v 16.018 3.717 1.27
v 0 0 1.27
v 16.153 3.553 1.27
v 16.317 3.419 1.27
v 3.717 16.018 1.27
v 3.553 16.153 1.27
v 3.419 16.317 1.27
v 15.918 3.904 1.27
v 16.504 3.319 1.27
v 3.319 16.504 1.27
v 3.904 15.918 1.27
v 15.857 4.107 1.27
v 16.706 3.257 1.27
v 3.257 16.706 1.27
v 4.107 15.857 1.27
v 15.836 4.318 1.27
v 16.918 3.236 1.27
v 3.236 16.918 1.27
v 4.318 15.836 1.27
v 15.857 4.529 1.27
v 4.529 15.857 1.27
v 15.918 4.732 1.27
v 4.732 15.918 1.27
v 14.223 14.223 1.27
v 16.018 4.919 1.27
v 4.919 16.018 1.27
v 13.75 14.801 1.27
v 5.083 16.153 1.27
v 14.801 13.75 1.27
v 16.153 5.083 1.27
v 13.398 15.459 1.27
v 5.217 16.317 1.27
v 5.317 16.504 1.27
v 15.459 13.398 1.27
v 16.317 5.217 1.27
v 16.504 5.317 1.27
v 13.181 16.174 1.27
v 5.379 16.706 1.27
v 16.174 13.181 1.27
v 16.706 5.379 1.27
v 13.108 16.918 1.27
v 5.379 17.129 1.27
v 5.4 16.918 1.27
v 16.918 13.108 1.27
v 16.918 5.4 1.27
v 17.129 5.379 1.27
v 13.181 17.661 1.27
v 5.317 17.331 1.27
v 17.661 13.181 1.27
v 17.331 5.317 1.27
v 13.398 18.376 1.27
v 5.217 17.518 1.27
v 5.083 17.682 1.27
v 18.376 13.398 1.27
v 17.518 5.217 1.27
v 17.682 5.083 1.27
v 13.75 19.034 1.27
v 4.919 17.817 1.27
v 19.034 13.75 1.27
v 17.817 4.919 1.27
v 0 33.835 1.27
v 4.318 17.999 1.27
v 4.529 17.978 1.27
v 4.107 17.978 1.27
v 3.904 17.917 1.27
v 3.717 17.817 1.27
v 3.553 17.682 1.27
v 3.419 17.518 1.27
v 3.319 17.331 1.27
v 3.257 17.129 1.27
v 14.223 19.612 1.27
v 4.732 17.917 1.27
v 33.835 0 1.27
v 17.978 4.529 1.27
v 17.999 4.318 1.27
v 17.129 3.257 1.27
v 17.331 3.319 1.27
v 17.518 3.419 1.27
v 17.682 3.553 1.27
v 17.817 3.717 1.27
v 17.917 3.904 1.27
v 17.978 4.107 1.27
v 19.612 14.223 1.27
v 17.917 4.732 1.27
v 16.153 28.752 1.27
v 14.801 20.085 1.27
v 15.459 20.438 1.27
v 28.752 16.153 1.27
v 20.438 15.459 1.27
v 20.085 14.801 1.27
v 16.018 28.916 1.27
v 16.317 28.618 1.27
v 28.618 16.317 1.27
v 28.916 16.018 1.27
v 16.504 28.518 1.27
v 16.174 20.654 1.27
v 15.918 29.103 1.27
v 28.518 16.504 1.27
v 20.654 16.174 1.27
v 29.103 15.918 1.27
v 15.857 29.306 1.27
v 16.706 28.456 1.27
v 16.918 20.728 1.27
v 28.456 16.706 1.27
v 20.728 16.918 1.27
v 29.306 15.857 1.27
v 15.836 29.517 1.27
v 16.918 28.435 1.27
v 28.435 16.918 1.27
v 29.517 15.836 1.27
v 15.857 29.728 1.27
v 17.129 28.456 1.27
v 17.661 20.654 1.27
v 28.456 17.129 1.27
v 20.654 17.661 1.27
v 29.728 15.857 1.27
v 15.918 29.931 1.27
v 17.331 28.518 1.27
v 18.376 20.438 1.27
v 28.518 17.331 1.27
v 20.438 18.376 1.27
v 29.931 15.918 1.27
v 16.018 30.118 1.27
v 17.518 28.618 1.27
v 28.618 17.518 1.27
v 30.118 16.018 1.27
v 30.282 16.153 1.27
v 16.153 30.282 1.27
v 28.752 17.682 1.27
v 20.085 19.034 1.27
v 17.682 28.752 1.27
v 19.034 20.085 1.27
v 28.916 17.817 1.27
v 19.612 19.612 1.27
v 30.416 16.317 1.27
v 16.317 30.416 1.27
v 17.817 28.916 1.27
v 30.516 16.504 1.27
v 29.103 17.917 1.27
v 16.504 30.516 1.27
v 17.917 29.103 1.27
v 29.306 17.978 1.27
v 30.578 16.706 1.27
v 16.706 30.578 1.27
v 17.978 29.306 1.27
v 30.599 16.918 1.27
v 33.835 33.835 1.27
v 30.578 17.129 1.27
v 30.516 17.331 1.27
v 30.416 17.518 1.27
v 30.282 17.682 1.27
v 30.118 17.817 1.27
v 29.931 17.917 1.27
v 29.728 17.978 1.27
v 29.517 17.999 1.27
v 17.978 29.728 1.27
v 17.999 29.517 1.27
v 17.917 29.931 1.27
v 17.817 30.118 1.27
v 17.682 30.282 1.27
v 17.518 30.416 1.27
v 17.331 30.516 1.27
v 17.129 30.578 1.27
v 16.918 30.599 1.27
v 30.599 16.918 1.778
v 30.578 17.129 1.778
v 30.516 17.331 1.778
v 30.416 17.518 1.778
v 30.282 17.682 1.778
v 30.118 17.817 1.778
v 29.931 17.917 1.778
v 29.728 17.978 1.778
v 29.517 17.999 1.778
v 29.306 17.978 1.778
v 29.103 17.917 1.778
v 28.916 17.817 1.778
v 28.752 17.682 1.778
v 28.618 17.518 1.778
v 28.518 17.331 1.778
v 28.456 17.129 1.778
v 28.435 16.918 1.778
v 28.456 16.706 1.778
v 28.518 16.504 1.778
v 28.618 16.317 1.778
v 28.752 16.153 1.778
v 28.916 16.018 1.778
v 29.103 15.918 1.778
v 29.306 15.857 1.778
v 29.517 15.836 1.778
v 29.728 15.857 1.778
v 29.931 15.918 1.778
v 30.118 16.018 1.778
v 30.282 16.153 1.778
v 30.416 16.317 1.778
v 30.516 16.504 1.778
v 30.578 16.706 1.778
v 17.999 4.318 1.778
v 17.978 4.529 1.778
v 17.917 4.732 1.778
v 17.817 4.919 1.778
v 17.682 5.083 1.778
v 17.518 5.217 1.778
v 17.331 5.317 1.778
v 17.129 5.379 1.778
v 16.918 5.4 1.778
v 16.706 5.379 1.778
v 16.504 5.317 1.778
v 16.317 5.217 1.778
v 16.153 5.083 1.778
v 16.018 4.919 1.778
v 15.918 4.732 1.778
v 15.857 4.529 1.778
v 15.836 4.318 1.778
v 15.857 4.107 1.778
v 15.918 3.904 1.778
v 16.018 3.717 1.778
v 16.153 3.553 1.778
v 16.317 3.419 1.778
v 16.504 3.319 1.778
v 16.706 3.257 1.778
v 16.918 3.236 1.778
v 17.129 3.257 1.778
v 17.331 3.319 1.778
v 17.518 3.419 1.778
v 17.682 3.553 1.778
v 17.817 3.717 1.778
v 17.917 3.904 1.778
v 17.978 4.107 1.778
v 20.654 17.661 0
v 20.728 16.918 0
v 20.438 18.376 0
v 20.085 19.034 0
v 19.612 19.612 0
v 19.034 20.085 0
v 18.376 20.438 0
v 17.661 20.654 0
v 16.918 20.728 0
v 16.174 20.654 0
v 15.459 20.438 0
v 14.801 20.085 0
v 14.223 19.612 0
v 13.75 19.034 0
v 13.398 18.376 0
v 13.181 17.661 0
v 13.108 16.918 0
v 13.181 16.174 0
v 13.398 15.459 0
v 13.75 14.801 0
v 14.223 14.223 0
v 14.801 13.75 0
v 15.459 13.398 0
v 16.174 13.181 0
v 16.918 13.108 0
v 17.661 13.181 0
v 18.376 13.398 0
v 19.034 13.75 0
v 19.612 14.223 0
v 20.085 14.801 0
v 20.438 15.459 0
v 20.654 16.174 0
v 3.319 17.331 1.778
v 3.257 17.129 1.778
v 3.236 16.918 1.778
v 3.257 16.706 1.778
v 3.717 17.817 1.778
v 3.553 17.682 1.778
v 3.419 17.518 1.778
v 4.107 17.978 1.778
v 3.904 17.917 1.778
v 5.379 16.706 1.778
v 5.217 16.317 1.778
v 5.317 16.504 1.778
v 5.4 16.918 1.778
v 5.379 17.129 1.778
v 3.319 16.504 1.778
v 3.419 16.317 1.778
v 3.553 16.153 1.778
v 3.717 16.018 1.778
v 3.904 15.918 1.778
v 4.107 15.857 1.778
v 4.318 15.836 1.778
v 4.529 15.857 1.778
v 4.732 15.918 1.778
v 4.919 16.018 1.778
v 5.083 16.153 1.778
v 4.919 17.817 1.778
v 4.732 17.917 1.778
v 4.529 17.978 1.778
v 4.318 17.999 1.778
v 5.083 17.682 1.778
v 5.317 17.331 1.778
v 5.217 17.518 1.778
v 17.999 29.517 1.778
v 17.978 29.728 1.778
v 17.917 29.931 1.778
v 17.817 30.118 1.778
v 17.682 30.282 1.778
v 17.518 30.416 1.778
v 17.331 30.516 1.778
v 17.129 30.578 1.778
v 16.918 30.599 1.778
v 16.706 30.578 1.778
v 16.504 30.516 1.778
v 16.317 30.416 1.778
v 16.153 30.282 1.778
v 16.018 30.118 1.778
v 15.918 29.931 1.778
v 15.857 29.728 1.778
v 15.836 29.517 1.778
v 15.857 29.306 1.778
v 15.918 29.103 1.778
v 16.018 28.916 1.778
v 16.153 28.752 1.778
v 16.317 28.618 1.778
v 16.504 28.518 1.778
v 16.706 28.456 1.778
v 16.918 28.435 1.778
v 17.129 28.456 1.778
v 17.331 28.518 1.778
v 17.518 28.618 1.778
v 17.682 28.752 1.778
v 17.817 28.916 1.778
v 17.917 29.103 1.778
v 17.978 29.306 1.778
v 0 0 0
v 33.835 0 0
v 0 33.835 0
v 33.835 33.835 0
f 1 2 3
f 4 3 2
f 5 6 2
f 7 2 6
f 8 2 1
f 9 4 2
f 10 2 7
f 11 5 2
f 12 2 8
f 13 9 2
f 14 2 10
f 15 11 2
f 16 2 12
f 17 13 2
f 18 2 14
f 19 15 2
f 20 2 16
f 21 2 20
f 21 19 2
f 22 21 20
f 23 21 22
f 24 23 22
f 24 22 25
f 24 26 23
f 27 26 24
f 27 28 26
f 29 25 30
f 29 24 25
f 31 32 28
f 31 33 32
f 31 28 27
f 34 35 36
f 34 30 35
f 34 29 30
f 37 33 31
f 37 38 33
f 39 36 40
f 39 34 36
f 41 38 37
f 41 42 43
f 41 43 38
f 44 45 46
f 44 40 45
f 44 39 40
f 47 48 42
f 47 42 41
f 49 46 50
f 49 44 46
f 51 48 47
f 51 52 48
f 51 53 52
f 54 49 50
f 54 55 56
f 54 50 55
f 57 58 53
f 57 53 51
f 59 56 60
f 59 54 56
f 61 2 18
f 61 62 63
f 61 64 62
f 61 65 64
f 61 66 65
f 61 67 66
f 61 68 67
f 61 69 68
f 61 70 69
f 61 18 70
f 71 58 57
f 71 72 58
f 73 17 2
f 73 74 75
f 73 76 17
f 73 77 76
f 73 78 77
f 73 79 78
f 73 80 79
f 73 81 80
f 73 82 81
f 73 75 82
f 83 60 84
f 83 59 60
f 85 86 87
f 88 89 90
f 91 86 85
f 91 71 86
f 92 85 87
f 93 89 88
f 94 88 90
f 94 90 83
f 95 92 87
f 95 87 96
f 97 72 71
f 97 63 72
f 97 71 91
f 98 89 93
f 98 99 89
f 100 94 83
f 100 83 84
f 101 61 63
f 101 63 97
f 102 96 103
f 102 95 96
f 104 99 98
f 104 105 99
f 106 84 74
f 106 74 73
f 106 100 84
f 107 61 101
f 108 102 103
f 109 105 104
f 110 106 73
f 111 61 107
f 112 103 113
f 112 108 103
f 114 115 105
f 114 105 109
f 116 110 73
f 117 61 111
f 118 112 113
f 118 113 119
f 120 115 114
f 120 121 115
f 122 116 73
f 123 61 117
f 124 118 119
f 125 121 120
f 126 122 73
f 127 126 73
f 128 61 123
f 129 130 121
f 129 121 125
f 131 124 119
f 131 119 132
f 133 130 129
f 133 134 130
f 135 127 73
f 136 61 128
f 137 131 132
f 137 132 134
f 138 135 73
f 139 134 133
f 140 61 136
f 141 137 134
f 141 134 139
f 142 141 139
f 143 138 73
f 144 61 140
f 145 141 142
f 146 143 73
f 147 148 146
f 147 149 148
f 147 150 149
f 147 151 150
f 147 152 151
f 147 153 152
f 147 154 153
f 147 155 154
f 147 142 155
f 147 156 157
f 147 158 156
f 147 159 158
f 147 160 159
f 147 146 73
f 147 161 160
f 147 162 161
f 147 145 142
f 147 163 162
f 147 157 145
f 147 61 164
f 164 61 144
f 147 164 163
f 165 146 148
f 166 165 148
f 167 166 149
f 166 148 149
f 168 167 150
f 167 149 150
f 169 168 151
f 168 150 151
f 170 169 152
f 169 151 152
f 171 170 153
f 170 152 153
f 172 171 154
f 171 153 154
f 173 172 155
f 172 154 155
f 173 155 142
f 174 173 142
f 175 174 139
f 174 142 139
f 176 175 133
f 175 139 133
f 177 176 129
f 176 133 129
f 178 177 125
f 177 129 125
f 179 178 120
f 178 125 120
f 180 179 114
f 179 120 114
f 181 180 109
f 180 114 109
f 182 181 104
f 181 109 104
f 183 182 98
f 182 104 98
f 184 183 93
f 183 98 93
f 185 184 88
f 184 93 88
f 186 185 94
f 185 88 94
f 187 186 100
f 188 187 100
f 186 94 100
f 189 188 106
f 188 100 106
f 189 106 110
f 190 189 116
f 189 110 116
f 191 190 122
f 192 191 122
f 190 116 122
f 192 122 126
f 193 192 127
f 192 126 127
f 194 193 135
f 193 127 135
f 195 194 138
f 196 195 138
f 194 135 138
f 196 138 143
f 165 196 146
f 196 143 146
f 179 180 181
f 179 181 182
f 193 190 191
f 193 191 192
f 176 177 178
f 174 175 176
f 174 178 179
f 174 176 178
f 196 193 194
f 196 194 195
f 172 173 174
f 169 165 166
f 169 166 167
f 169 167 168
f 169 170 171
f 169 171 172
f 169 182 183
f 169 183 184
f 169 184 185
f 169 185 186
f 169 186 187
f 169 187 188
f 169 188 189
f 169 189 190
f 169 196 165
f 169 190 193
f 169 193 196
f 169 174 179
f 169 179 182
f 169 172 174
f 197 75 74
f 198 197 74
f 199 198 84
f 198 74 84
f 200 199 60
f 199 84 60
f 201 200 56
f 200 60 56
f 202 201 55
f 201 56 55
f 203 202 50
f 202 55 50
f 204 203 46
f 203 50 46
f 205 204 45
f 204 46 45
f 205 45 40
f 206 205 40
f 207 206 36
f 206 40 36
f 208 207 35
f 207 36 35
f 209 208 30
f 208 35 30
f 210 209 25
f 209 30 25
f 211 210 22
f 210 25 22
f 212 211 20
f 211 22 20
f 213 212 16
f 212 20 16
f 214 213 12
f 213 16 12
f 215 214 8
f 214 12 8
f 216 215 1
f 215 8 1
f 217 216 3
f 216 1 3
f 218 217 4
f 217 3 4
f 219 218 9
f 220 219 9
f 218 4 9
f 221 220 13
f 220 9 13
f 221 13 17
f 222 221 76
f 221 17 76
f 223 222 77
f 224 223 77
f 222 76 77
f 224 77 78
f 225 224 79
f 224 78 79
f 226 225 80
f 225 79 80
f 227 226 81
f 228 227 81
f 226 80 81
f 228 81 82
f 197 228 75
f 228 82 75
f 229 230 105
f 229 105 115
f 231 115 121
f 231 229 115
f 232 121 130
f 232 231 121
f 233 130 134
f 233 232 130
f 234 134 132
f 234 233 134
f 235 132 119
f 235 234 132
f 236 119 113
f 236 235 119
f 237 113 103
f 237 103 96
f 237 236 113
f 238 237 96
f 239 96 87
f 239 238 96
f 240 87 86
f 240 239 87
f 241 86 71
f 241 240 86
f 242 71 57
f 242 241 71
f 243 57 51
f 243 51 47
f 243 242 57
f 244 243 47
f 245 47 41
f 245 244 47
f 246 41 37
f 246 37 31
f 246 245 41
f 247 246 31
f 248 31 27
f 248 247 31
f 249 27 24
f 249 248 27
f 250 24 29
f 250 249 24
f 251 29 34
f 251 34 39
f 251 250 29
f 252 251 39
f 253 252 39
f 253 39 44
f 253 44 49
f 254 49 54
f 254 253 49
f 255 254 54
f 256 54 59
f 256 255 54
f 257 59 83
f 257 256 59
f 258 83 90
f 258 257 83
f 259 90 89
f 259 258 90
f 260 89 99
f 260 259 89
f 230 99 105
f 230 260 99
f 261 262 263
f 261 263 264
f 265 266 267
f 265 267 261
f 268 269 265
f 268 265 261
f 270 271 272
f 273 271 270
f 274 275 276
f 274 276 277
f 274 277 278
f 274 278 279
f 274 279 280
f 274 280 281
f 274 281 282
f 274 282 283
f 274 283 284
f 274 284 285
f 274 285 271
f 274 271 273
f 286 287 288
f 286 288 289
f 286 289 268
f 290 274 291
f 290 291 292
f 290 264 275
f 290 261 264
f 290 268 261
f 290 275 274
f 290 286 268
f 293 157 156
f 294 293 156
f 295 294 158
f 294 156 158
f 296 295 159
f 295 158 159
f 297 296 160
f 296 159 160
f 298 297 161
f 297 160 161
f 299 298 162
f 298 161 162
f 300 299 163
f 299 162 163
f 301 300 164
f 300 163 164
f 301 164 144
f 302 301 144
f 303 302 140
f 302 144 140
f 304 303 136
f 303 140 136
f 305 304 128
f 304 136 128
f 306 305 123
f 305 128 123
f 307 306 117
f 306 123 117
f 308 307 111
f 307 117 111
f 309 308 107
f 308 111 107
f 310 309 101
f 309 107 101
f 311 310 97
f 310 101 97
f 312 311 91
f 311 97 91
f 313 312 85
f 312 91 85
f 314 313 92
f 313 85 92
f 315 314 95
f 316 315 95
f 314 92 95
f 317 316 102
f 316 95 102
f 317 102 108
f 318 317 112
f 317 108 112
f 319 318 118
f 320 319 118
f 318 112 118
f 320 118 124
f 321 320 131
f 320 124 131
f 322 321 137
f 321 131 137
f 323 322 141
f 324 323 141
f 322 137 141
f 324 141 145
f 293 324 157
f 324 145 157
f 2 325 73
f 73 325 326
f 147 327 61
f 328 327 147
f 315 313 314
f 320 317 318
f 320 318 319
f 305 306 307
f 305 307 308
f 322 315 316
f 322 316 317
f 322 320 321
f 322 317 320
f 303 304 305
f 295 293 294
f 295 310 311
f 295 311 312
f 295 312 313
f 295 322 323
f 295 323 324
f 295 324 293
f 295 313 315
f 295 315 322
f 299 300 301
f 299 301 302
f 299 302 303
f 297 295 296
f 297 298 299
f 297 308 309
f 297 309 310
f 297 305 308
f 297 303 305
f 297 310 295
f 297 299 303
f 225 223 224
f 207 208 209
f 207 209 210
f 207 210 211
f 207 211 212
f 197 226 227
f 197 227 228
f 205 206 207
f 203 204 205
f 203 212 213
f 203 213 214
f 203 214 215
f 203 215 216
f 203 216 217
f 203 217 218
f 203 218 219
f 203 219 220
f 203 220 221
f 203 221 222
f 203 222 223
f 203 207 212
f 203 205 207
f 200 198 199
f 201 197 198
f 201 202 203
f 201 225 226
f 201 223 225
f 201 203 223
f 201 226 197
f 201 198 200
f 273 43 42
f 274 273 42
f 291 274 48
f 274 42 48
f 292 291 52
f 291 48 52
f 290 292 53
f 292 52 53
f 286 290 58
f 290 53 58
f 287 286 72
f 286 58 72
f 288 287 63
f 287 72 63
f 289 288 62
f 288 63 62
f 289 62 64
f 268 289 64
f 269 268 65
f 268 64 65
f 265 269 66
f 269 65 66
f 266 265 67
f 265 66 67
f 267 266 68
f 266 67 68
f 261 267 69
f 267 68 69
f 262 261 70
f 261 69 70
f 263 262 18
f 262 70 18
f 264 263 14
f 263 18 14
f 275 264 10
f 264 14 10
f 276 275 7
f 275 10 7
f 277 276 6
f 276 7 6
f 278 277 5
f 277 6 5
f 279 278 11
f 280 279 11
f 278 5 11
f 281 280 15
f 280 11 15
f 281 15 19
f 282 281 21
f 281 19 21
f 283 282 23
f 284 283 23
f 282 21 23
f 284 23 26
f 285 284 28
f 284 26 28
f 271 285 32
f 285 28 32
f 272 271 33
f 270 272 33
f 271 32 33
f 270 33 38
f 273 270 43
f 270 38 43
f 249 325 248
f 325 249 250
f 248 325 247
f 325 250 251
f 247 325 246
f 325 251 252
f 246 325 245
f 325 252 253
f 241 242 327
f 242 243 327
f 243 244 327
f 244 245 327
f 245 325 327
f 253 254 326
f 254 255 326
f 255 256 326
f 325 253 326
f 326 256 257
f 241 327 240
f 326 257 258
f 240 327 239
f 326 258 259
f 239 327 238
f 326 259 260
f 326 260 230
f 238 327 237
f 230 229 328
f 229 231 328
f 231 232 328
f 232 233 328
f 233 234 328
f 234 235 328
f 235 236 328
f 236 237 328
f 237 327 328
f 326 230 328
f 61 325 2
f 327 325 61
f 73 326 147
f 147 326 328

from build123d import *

# Parameters (mm, degrees)
F0_W     = 33.835038
F0_H     = 33.835038
F0_R     = 3.81
F1_DEPTH = 1.27
F2_R     = 1.081703
F2_R_2   = 1.08171
F3_DEPTH = 0.508


with BuildPart() as f1:
    # F0 (on Top) → F1 (new body)
    with BuildSketch(Plane.XY):
        with Locations((16.917519, 16.917519)):
            Rectangle(F0_W, F0_H)
        with Locations((16.917519, 16.917519)):
            Circle(F0_R, mode=Mode.SUBTRACT)
    extrude(amount=F1_DEPTH)

    # F2 (on face) → F3 (join)
    with BuildSketch(Plane.XY.offset(1.27)):
        with Locations((29.517038, 16.917519)):
            Circle(F2_R)
        with Locations((4.318, 16.917519)):
            Circle(F2_R)
        with Locations((16.917519, 29.517038)):
            Circle(F2_R_2)
        with Locations((16.917519, 4.318)):
            Circle(F2_R_2)
    extrude(amount=F3_DEPTH)


solid = f1.part
